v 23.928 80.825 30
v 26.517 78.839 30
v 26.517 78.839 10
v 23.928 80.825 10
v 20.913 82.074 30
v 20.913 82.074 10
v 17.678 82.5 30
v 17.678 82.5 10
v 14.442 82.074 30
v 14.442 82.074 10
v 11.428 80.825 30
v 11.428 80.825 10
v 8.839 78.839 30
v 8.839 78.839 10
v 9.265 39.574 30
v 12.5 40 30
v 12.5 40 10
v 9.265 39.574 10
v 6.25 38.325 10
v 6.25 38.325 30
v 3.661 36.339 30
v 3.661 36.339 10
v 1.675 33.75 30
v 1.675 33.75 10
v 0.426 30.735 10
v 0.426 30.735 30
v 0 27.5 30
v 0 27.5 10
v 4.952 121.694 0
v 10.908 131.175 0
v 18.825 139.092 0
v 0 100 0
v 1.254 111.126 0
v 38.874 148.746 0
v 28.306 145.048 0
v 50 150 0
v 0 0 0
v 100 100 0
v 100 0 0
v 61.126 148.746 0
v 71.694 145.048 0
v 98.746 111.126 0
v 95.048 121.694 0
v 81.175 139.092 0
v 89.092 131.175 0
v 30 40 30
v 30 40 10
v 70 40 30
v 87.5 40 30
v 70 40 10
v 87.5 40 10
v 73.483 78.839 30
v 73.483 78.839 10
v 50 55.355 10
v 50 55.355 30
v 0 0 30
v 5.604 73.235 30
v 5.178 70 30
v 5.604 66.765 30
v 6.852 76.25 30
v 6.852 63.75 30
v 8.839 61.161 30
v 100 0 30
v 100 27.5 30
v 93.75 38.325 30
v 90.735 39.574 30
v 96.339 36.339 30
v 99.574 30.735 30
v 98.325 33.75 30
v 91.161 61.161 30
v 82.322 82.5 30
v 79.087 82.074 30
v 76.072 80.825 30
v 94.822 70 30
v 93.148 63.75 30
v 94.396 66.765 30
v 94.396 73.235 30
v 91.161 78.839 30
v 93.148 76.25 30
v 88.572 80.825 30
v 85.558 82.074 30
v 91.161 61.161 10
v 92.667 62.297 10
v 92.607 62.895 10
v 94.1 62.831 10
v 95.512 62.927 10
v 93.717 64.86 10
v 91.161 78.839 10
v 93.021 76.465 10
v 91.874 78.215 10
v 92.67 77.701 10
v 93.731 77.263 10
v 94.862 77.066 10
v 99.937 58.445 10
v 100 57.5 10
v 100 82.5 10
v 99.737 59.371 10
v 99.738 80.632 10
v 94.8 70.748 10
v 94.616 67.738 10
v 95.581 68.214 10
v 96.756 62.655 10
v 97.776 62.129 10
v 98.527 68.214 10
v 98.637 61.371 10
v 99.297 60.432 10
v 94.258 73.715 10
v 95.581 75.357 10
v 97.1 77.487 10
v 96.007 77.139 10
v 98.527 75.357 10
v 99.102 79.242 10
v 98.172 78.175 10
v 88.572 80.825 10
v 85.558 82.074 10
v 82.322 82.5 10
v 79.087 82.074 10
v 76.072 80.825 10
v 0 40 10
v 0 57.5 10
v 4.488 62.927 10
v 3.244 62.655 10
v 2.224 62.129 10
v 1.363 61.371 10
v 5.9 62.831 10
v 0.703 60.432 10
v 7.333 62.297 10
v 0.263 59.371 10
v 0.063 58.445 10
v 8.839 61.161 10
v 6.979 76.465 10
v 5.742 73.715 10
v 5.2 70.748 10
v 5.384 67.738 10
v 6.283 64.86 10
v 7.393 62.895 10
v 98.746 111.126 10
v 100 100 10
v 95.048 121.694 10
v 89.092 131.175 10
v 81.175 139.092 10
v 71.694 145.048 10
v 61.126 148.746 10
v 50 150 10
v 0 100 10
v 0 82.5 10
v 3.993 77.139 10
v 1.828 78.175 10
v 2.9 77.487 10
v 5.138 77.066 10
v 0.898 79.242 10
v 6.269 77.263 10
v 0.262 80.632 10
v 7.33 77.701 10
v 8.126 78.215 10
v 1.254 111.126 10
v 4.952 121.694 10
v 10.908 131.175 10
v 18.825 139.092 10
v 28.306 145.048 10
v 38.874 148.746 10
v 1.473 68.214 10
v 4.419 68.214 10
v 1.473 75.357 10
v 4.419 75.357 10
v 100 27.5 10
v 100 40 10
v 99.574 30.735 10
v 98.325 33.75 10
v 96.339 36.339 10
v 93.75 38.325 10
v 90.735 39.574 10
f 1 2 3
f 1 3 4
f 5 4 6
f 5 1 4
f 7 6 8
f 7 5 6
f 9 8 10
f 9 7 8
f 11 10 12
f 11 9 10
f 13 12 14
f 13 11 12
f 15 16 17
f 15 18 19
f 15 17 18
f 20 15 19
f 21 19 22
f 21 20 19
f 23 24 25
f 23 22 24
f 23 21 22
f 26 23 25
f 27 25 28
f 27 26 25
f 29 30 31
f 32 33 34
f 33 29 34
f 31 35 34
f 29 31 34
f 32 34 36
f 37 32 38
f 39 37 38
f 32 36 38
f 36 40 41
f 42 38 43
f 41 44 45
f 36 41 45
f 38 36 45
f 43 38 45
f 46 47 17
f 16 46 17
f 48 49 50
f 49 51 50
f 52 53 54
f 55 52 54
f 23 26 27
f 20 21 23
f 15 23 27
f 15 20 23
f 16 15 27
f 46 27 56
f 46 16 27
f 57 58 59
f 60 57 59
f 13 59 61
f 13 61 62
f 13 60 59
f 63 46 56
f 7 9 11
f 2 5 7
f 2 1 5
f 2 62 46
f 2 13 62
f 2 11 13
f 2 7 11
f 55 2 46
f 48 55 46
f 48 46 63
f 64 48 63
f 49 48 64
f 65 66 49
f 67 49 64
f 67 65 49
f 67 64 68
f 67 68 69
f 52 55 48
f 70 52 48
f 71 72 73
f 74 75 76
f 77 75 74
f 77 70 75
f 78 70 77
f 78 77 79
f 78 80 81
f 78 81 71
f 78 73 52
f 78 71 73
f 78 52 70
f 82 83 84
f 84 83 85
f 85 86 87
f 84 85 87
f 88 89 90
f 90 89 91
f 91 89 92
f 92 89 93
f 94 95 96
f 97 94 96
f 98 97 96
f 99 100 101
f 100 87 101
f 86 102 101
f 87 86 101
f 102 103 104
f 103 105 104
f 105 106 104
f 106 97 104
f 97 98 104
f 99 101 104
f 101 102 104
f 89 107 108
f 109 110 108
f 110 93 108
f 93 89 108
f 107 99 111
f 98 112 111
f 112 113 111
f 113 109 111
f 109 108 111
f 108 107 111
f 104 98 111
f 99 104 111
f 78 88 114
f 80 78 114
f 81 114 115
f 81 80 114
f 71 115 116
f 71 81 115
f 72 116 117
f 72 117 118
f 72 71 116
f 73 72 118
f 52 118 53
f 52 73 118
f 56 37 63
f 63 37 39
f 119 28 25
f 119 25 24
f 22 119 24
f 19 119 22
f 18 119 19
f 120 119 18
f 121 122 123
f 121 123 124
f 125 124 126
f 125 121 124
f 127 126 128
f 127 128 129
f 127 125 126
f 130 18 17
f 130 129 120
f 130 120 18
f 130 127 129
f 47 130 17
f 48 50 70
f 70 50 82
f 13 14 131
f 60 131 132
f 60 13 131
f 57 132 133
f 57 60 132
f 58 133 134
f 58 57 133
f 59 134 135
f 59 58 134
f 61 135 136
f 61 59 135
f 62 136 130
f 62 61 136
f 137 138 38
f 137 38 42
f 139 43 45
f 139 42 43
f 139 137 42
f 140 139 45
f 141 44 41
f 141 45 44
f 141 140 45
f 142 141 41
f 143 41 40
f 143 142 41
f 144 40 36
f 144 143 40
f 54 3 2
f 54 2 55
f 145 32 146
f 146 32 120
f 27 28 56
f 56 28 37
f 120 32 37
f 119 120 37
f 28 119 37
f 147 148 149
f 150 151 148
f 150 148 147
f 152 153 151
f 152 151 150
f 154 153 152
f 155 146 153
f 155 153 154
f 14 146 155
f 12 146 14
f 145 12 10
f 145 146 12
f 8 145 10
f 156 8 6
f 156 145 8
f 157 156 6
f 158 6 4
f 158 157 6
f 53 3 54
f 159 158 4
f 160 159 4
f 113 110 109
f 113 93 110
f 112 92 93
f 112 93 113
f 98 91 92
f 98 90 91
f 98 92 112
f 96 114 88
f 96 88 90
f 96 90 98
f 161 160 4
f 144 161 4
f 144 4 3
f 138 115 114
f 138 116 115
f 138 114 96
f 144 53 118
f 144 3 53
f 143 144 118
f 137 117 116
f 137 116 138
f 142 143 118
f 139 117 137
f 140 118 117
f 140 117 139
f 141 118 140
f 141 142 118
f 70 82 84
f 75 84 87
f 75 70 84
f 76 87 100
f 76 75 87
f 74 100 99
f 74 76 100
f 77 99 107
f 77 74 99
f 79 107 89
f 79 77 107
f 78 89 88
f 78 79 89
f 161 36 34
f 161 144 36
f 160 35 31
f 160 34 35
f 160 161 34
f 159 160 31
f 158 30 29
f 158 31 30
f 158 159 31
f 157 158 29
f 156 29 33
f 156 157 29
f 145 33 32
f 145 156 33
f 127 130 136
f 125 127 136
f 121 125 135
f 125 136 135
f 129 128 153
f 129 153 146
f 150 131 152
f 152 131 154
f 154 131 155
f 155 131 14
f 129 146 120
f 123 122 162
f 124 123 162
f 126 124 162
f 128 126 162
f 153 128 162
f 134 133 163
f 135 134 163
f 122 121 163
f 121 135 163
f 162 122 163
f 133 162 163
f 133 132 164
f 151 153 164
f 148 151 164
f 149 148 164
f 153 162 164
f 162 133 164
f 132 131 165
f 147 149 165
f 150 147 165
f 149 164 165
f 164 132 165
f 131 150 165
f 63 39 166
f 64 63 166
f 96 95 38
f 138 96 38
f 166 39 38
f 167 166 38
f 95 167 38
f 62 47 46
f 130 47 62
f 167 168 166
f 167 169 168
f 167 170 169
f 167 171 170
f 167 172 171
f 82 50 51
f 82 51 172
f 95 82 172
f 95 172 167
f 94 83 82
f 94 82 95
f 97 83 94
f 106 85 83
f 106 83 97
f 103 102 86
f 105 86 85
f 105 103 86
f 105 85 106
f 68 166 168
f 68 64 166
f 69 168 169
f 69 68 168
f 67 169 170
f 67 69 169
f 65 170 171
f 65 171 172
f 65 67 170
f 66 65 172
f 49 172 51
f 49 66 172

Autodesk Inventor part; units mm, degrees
ref_plane "YZ Plane" through (0, 0, 0) normal (1, 0, 0) x (0, 1, 0)
ref_plane "XZ Plane" through (0, 0, 0) normal (0, 1, 0) x (-1, 0, 0)
ref_plane "XY Plane" through (0, 0, 0) normal (0, 0, 1) x (1, 0, 0)
sketch "Sketch9" plane through (0, 0, 0) normal (0, 0, 1) x (1, 0, 0)
  line L0 (0, 0) -> (100, 0)
  line L1 (100, 0) -> (100, 150)
  line L2 (100, 150) -> (0, 150)
  line L3 (0, 150) -> (0, 0)
  dimension "d68" = 100
  dimension "d69" = 150
extrude "Extrusion8" add sketch "Sketch9" along normal blind 10
sketch "Sketch10" plane through (0, 0, 10) normal (0, 0, 1) x (1, 0, 0)
  line L0 (0, 150) -> (0, 0) projected
  line L1 (0, 0) -> (100, 0)
  line L2 (100, 0) -> (100, 20)
  line L3 (100, 20) -> (0, 20)
  line L4 (0, 20) -> (0, 0)
  line L5 (50, 20) -> (0, 70)
  line L6 (0, 70) -> (17.6777, 87.6777)
  line L7 (17.6777, 87.6777) -> (67.6777, 37.6777)
  line L8 (67.6777, 37.6777) -> (50, 20)
  line L9 (50, 20) -> (120.7107, 20) construction
  line L10 (50, 20) -> (100, 70)
  line L11 (100, 70) -> (82.3223, 87.6777)
  line L12 (82.3223, 87.6777) -> (32.3223, 37.6777)
  line L13 (32.3223, 37.6777) -> (50, 20)
  line L14 (50, 20) -> (120.7107, 20) construction
  line L15 (0, 20) -> (100, 20)
  line L16 (100, 20) -> (100, 40)
  line L17 (100, 40) -> (0, 40)
  line L18 (0, 40) -> (0, 20)
  point P0 (70, 40)
  point P1 (65.3553, 40)
  point P2 (50, 55.3553)
  point P3 (30, 40)
  dimension "d72" = 100
  dimension "d73" = 20
  dimension "d74" = 135
  dimension "d75" = 25
  dimension "d76" = 45
  dimension "d77" = 25
  dimension "d78" = 20
extrude "Extrusion9" add sketch "Sketch10" along normal blind 20 contours L6 L7 L12 L17 L5 | L17 L5 L3 L0 | L17 L12 L5 | L3 L2 L1 L0 | L12 L17 L7 L8 L5 | L12 L7 L17 | L12 L11 L10 L17 L7 | L8 L10 L17 L16 L3 | L17 L10 L7
fillet "Fillet8" radius 50 2 edges at (0, 150, 5) (100, 150, 5)
fillet "Fillet9" radius 12.5 6 edges at (17.6777, 87.6777, 20) (0, 70, 20) (82.3223, 87.6777, 20) (100, 70, 20) (0, 40, 20) (100, 40, 20)
properties part number "Marker Holder 90 deg"
